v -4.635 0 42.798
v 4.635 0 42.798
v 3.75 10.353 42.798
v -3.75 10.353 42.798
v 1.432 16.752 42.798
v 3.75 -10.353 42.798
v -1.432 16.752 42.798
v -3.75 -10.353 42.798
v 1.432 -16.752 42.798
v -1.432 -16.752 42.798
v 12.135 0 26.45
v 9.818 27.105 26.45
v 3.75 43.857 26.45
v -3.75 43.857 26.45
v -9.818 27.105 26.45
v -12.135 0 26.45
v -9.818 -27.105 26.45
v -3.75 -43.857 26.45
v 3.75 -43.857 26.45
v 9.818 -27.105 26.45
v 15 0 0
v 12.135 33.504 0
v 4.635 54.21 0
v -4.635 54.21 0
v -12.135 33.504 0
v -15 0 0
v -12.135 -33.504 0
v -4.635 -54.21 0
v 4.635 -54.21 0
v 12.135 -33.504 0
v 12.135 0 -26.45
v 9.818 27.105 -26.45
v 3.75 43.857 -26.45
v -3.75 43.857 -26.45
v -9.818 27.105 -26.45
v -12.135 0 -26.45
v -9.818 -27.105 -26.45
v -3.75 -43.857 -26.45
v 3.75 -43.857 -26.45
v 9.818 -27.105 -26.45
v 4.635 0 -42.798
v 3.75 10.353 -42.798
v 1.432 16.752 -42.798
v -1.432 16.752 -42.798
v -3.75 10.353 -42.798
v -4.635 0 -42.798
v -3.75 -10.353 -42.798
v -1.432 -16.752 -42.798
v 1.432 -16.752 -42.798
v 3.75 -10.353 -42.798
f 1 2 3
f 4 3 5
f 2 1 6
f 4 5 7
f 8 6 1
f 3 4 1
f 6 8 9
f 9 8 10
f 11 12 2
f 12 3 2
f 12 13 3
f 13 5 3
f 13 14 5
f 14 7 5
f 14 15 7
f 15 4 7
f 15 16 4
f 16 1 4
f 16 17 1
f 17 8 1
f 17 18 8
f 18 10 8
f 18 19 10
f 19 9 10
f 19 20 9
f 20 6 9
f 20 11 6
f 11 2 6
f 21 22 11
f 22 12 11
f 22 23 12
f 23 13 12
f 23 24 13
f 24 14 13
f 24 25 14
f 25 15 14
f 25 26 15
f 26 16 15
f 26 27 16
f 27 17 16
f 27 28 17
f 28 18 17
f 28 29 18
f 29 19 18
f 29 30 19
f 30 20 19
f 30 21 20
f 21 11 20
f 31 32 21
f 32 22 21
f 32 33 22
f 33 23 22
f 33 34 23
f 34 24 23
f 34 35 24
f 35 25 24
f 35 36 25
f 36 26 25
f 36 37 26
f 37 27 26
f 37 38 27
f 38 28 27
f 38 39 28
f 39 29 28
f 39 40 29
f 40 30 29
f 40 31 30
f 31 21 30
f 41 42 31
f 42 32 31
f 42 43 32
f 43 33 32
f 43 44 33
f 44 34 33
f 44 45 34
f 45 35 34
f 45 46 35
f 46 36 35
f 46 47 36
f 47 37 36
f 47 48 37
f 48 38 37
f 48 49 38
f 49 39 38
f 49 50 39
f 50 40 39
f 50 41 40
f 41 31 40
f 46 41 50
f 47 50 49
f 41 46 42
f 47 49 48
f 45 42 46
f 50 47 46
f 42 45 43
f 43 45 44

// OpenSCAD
// Generated by SolidPython 1.0.1 on 2020-07-29 00:46:47


scale(v = [5, 19, 15]) {
	sphere(r = 3);
}
/***********************************************
*********      SolidPython code:      **********
************************************************
 
# import packages: SolidPython
from solid import *
from solid.utils import *
from itertools import chain, combinations, permutations


class Resize:

    def __init__(self, scad_file):
        self.scad_file = scad_file
        #self.scad_file = import_scad(scad_file)
        # cone/cylinder param:
        self.r1 = 0
        self.r2 = 0
        self.h = 0
        # rectangular prism param:
        self.w = 0
        self.l = 0
        # ellipse param:
        self.r = 0

    # import OpenScad code (file name corresponds to shape)


    # classify shape + parameters
    def assign(self, param1, param2, param3):
        if self.scad_file == 'cone.scad':
            self.r1 = param1
            self.r2 = param2
            self.h = param3
        elif self.scad_file == 'cylinder.scad':
            self.r1 = param1
            self.r2 = param2
            self.h = param3
        elif self.scad_file == 'rectangularPrism.scad':
            self.h = param1
            self.l = param2
            self.w = param3
        else:
            self.r = param1
            self.h = param2

    # resize parameters
    def iterate(self):
        x = range(3, 20, 2)
        i = 1
        if self.scad_file == 'cone.scad':
            tempList = list(permutations(x, 2))
            for temp in tempList:
                param1 = temp[0]
                param2 = temp[1]
                filepath = 'produced_scad_files/' + 'cone' + str(param1) + '_' + str(param2) + '_' + '.scad'
                scad_render_to_file(cylinder(h=param1, r1=param2, r2=0), filepath)

        elif self.scad_file == 'cylinder.scad':
            tempList = list(permutations(x, 3))
            for temp in tempList:
                param1 = temp[0]
                param2 = temp[1]
                filepath = 'produced_scad_files/' + 'cylinder' + str(param1) + '_' + str(param2) + '_' + '.scad'
                scad_render_to_file(cylinder(h=param1, r1=param2, r2=param2), filepath)

        elif self.scad_file == 'rectangularPrism.scad':
            tempList = list(permutations(x, 3))
            for temp in tempList:
                param1 = temp[0]
                param2 = temp[1]
                param3 = temp[2]
                filepath = 'produced_scad_files/' + 'rectangularPrism' + str(param1) + '_' + str(param2) + '_' + str(
                    param3) + '.scad'
                scad_render_to_file(cube(size=(param1, param2, param3)), filepath)

        elif self.scad_file == 'ellipse.scad':
            tempList = list(permutations(x, 4))
            for temp in tempList:
                param1 = temp[0]
                param2 = temp[1]
                param3 = temp[2]
                param4 = temp[3]
                filepath = 'produced_scad_files/' + 'ellipse' + str(param1) + '_' + str(param2) + '_' + str(param3) + '_' + str(param4) + '.scad'
                scad_render_to_file(scale([param1, param2, param3])(sphere(r=param4)), filepath)

    def render_to_scadfile(self):
        scad_render_to_file(scad, 'example.scad') 
 
************************************************/
